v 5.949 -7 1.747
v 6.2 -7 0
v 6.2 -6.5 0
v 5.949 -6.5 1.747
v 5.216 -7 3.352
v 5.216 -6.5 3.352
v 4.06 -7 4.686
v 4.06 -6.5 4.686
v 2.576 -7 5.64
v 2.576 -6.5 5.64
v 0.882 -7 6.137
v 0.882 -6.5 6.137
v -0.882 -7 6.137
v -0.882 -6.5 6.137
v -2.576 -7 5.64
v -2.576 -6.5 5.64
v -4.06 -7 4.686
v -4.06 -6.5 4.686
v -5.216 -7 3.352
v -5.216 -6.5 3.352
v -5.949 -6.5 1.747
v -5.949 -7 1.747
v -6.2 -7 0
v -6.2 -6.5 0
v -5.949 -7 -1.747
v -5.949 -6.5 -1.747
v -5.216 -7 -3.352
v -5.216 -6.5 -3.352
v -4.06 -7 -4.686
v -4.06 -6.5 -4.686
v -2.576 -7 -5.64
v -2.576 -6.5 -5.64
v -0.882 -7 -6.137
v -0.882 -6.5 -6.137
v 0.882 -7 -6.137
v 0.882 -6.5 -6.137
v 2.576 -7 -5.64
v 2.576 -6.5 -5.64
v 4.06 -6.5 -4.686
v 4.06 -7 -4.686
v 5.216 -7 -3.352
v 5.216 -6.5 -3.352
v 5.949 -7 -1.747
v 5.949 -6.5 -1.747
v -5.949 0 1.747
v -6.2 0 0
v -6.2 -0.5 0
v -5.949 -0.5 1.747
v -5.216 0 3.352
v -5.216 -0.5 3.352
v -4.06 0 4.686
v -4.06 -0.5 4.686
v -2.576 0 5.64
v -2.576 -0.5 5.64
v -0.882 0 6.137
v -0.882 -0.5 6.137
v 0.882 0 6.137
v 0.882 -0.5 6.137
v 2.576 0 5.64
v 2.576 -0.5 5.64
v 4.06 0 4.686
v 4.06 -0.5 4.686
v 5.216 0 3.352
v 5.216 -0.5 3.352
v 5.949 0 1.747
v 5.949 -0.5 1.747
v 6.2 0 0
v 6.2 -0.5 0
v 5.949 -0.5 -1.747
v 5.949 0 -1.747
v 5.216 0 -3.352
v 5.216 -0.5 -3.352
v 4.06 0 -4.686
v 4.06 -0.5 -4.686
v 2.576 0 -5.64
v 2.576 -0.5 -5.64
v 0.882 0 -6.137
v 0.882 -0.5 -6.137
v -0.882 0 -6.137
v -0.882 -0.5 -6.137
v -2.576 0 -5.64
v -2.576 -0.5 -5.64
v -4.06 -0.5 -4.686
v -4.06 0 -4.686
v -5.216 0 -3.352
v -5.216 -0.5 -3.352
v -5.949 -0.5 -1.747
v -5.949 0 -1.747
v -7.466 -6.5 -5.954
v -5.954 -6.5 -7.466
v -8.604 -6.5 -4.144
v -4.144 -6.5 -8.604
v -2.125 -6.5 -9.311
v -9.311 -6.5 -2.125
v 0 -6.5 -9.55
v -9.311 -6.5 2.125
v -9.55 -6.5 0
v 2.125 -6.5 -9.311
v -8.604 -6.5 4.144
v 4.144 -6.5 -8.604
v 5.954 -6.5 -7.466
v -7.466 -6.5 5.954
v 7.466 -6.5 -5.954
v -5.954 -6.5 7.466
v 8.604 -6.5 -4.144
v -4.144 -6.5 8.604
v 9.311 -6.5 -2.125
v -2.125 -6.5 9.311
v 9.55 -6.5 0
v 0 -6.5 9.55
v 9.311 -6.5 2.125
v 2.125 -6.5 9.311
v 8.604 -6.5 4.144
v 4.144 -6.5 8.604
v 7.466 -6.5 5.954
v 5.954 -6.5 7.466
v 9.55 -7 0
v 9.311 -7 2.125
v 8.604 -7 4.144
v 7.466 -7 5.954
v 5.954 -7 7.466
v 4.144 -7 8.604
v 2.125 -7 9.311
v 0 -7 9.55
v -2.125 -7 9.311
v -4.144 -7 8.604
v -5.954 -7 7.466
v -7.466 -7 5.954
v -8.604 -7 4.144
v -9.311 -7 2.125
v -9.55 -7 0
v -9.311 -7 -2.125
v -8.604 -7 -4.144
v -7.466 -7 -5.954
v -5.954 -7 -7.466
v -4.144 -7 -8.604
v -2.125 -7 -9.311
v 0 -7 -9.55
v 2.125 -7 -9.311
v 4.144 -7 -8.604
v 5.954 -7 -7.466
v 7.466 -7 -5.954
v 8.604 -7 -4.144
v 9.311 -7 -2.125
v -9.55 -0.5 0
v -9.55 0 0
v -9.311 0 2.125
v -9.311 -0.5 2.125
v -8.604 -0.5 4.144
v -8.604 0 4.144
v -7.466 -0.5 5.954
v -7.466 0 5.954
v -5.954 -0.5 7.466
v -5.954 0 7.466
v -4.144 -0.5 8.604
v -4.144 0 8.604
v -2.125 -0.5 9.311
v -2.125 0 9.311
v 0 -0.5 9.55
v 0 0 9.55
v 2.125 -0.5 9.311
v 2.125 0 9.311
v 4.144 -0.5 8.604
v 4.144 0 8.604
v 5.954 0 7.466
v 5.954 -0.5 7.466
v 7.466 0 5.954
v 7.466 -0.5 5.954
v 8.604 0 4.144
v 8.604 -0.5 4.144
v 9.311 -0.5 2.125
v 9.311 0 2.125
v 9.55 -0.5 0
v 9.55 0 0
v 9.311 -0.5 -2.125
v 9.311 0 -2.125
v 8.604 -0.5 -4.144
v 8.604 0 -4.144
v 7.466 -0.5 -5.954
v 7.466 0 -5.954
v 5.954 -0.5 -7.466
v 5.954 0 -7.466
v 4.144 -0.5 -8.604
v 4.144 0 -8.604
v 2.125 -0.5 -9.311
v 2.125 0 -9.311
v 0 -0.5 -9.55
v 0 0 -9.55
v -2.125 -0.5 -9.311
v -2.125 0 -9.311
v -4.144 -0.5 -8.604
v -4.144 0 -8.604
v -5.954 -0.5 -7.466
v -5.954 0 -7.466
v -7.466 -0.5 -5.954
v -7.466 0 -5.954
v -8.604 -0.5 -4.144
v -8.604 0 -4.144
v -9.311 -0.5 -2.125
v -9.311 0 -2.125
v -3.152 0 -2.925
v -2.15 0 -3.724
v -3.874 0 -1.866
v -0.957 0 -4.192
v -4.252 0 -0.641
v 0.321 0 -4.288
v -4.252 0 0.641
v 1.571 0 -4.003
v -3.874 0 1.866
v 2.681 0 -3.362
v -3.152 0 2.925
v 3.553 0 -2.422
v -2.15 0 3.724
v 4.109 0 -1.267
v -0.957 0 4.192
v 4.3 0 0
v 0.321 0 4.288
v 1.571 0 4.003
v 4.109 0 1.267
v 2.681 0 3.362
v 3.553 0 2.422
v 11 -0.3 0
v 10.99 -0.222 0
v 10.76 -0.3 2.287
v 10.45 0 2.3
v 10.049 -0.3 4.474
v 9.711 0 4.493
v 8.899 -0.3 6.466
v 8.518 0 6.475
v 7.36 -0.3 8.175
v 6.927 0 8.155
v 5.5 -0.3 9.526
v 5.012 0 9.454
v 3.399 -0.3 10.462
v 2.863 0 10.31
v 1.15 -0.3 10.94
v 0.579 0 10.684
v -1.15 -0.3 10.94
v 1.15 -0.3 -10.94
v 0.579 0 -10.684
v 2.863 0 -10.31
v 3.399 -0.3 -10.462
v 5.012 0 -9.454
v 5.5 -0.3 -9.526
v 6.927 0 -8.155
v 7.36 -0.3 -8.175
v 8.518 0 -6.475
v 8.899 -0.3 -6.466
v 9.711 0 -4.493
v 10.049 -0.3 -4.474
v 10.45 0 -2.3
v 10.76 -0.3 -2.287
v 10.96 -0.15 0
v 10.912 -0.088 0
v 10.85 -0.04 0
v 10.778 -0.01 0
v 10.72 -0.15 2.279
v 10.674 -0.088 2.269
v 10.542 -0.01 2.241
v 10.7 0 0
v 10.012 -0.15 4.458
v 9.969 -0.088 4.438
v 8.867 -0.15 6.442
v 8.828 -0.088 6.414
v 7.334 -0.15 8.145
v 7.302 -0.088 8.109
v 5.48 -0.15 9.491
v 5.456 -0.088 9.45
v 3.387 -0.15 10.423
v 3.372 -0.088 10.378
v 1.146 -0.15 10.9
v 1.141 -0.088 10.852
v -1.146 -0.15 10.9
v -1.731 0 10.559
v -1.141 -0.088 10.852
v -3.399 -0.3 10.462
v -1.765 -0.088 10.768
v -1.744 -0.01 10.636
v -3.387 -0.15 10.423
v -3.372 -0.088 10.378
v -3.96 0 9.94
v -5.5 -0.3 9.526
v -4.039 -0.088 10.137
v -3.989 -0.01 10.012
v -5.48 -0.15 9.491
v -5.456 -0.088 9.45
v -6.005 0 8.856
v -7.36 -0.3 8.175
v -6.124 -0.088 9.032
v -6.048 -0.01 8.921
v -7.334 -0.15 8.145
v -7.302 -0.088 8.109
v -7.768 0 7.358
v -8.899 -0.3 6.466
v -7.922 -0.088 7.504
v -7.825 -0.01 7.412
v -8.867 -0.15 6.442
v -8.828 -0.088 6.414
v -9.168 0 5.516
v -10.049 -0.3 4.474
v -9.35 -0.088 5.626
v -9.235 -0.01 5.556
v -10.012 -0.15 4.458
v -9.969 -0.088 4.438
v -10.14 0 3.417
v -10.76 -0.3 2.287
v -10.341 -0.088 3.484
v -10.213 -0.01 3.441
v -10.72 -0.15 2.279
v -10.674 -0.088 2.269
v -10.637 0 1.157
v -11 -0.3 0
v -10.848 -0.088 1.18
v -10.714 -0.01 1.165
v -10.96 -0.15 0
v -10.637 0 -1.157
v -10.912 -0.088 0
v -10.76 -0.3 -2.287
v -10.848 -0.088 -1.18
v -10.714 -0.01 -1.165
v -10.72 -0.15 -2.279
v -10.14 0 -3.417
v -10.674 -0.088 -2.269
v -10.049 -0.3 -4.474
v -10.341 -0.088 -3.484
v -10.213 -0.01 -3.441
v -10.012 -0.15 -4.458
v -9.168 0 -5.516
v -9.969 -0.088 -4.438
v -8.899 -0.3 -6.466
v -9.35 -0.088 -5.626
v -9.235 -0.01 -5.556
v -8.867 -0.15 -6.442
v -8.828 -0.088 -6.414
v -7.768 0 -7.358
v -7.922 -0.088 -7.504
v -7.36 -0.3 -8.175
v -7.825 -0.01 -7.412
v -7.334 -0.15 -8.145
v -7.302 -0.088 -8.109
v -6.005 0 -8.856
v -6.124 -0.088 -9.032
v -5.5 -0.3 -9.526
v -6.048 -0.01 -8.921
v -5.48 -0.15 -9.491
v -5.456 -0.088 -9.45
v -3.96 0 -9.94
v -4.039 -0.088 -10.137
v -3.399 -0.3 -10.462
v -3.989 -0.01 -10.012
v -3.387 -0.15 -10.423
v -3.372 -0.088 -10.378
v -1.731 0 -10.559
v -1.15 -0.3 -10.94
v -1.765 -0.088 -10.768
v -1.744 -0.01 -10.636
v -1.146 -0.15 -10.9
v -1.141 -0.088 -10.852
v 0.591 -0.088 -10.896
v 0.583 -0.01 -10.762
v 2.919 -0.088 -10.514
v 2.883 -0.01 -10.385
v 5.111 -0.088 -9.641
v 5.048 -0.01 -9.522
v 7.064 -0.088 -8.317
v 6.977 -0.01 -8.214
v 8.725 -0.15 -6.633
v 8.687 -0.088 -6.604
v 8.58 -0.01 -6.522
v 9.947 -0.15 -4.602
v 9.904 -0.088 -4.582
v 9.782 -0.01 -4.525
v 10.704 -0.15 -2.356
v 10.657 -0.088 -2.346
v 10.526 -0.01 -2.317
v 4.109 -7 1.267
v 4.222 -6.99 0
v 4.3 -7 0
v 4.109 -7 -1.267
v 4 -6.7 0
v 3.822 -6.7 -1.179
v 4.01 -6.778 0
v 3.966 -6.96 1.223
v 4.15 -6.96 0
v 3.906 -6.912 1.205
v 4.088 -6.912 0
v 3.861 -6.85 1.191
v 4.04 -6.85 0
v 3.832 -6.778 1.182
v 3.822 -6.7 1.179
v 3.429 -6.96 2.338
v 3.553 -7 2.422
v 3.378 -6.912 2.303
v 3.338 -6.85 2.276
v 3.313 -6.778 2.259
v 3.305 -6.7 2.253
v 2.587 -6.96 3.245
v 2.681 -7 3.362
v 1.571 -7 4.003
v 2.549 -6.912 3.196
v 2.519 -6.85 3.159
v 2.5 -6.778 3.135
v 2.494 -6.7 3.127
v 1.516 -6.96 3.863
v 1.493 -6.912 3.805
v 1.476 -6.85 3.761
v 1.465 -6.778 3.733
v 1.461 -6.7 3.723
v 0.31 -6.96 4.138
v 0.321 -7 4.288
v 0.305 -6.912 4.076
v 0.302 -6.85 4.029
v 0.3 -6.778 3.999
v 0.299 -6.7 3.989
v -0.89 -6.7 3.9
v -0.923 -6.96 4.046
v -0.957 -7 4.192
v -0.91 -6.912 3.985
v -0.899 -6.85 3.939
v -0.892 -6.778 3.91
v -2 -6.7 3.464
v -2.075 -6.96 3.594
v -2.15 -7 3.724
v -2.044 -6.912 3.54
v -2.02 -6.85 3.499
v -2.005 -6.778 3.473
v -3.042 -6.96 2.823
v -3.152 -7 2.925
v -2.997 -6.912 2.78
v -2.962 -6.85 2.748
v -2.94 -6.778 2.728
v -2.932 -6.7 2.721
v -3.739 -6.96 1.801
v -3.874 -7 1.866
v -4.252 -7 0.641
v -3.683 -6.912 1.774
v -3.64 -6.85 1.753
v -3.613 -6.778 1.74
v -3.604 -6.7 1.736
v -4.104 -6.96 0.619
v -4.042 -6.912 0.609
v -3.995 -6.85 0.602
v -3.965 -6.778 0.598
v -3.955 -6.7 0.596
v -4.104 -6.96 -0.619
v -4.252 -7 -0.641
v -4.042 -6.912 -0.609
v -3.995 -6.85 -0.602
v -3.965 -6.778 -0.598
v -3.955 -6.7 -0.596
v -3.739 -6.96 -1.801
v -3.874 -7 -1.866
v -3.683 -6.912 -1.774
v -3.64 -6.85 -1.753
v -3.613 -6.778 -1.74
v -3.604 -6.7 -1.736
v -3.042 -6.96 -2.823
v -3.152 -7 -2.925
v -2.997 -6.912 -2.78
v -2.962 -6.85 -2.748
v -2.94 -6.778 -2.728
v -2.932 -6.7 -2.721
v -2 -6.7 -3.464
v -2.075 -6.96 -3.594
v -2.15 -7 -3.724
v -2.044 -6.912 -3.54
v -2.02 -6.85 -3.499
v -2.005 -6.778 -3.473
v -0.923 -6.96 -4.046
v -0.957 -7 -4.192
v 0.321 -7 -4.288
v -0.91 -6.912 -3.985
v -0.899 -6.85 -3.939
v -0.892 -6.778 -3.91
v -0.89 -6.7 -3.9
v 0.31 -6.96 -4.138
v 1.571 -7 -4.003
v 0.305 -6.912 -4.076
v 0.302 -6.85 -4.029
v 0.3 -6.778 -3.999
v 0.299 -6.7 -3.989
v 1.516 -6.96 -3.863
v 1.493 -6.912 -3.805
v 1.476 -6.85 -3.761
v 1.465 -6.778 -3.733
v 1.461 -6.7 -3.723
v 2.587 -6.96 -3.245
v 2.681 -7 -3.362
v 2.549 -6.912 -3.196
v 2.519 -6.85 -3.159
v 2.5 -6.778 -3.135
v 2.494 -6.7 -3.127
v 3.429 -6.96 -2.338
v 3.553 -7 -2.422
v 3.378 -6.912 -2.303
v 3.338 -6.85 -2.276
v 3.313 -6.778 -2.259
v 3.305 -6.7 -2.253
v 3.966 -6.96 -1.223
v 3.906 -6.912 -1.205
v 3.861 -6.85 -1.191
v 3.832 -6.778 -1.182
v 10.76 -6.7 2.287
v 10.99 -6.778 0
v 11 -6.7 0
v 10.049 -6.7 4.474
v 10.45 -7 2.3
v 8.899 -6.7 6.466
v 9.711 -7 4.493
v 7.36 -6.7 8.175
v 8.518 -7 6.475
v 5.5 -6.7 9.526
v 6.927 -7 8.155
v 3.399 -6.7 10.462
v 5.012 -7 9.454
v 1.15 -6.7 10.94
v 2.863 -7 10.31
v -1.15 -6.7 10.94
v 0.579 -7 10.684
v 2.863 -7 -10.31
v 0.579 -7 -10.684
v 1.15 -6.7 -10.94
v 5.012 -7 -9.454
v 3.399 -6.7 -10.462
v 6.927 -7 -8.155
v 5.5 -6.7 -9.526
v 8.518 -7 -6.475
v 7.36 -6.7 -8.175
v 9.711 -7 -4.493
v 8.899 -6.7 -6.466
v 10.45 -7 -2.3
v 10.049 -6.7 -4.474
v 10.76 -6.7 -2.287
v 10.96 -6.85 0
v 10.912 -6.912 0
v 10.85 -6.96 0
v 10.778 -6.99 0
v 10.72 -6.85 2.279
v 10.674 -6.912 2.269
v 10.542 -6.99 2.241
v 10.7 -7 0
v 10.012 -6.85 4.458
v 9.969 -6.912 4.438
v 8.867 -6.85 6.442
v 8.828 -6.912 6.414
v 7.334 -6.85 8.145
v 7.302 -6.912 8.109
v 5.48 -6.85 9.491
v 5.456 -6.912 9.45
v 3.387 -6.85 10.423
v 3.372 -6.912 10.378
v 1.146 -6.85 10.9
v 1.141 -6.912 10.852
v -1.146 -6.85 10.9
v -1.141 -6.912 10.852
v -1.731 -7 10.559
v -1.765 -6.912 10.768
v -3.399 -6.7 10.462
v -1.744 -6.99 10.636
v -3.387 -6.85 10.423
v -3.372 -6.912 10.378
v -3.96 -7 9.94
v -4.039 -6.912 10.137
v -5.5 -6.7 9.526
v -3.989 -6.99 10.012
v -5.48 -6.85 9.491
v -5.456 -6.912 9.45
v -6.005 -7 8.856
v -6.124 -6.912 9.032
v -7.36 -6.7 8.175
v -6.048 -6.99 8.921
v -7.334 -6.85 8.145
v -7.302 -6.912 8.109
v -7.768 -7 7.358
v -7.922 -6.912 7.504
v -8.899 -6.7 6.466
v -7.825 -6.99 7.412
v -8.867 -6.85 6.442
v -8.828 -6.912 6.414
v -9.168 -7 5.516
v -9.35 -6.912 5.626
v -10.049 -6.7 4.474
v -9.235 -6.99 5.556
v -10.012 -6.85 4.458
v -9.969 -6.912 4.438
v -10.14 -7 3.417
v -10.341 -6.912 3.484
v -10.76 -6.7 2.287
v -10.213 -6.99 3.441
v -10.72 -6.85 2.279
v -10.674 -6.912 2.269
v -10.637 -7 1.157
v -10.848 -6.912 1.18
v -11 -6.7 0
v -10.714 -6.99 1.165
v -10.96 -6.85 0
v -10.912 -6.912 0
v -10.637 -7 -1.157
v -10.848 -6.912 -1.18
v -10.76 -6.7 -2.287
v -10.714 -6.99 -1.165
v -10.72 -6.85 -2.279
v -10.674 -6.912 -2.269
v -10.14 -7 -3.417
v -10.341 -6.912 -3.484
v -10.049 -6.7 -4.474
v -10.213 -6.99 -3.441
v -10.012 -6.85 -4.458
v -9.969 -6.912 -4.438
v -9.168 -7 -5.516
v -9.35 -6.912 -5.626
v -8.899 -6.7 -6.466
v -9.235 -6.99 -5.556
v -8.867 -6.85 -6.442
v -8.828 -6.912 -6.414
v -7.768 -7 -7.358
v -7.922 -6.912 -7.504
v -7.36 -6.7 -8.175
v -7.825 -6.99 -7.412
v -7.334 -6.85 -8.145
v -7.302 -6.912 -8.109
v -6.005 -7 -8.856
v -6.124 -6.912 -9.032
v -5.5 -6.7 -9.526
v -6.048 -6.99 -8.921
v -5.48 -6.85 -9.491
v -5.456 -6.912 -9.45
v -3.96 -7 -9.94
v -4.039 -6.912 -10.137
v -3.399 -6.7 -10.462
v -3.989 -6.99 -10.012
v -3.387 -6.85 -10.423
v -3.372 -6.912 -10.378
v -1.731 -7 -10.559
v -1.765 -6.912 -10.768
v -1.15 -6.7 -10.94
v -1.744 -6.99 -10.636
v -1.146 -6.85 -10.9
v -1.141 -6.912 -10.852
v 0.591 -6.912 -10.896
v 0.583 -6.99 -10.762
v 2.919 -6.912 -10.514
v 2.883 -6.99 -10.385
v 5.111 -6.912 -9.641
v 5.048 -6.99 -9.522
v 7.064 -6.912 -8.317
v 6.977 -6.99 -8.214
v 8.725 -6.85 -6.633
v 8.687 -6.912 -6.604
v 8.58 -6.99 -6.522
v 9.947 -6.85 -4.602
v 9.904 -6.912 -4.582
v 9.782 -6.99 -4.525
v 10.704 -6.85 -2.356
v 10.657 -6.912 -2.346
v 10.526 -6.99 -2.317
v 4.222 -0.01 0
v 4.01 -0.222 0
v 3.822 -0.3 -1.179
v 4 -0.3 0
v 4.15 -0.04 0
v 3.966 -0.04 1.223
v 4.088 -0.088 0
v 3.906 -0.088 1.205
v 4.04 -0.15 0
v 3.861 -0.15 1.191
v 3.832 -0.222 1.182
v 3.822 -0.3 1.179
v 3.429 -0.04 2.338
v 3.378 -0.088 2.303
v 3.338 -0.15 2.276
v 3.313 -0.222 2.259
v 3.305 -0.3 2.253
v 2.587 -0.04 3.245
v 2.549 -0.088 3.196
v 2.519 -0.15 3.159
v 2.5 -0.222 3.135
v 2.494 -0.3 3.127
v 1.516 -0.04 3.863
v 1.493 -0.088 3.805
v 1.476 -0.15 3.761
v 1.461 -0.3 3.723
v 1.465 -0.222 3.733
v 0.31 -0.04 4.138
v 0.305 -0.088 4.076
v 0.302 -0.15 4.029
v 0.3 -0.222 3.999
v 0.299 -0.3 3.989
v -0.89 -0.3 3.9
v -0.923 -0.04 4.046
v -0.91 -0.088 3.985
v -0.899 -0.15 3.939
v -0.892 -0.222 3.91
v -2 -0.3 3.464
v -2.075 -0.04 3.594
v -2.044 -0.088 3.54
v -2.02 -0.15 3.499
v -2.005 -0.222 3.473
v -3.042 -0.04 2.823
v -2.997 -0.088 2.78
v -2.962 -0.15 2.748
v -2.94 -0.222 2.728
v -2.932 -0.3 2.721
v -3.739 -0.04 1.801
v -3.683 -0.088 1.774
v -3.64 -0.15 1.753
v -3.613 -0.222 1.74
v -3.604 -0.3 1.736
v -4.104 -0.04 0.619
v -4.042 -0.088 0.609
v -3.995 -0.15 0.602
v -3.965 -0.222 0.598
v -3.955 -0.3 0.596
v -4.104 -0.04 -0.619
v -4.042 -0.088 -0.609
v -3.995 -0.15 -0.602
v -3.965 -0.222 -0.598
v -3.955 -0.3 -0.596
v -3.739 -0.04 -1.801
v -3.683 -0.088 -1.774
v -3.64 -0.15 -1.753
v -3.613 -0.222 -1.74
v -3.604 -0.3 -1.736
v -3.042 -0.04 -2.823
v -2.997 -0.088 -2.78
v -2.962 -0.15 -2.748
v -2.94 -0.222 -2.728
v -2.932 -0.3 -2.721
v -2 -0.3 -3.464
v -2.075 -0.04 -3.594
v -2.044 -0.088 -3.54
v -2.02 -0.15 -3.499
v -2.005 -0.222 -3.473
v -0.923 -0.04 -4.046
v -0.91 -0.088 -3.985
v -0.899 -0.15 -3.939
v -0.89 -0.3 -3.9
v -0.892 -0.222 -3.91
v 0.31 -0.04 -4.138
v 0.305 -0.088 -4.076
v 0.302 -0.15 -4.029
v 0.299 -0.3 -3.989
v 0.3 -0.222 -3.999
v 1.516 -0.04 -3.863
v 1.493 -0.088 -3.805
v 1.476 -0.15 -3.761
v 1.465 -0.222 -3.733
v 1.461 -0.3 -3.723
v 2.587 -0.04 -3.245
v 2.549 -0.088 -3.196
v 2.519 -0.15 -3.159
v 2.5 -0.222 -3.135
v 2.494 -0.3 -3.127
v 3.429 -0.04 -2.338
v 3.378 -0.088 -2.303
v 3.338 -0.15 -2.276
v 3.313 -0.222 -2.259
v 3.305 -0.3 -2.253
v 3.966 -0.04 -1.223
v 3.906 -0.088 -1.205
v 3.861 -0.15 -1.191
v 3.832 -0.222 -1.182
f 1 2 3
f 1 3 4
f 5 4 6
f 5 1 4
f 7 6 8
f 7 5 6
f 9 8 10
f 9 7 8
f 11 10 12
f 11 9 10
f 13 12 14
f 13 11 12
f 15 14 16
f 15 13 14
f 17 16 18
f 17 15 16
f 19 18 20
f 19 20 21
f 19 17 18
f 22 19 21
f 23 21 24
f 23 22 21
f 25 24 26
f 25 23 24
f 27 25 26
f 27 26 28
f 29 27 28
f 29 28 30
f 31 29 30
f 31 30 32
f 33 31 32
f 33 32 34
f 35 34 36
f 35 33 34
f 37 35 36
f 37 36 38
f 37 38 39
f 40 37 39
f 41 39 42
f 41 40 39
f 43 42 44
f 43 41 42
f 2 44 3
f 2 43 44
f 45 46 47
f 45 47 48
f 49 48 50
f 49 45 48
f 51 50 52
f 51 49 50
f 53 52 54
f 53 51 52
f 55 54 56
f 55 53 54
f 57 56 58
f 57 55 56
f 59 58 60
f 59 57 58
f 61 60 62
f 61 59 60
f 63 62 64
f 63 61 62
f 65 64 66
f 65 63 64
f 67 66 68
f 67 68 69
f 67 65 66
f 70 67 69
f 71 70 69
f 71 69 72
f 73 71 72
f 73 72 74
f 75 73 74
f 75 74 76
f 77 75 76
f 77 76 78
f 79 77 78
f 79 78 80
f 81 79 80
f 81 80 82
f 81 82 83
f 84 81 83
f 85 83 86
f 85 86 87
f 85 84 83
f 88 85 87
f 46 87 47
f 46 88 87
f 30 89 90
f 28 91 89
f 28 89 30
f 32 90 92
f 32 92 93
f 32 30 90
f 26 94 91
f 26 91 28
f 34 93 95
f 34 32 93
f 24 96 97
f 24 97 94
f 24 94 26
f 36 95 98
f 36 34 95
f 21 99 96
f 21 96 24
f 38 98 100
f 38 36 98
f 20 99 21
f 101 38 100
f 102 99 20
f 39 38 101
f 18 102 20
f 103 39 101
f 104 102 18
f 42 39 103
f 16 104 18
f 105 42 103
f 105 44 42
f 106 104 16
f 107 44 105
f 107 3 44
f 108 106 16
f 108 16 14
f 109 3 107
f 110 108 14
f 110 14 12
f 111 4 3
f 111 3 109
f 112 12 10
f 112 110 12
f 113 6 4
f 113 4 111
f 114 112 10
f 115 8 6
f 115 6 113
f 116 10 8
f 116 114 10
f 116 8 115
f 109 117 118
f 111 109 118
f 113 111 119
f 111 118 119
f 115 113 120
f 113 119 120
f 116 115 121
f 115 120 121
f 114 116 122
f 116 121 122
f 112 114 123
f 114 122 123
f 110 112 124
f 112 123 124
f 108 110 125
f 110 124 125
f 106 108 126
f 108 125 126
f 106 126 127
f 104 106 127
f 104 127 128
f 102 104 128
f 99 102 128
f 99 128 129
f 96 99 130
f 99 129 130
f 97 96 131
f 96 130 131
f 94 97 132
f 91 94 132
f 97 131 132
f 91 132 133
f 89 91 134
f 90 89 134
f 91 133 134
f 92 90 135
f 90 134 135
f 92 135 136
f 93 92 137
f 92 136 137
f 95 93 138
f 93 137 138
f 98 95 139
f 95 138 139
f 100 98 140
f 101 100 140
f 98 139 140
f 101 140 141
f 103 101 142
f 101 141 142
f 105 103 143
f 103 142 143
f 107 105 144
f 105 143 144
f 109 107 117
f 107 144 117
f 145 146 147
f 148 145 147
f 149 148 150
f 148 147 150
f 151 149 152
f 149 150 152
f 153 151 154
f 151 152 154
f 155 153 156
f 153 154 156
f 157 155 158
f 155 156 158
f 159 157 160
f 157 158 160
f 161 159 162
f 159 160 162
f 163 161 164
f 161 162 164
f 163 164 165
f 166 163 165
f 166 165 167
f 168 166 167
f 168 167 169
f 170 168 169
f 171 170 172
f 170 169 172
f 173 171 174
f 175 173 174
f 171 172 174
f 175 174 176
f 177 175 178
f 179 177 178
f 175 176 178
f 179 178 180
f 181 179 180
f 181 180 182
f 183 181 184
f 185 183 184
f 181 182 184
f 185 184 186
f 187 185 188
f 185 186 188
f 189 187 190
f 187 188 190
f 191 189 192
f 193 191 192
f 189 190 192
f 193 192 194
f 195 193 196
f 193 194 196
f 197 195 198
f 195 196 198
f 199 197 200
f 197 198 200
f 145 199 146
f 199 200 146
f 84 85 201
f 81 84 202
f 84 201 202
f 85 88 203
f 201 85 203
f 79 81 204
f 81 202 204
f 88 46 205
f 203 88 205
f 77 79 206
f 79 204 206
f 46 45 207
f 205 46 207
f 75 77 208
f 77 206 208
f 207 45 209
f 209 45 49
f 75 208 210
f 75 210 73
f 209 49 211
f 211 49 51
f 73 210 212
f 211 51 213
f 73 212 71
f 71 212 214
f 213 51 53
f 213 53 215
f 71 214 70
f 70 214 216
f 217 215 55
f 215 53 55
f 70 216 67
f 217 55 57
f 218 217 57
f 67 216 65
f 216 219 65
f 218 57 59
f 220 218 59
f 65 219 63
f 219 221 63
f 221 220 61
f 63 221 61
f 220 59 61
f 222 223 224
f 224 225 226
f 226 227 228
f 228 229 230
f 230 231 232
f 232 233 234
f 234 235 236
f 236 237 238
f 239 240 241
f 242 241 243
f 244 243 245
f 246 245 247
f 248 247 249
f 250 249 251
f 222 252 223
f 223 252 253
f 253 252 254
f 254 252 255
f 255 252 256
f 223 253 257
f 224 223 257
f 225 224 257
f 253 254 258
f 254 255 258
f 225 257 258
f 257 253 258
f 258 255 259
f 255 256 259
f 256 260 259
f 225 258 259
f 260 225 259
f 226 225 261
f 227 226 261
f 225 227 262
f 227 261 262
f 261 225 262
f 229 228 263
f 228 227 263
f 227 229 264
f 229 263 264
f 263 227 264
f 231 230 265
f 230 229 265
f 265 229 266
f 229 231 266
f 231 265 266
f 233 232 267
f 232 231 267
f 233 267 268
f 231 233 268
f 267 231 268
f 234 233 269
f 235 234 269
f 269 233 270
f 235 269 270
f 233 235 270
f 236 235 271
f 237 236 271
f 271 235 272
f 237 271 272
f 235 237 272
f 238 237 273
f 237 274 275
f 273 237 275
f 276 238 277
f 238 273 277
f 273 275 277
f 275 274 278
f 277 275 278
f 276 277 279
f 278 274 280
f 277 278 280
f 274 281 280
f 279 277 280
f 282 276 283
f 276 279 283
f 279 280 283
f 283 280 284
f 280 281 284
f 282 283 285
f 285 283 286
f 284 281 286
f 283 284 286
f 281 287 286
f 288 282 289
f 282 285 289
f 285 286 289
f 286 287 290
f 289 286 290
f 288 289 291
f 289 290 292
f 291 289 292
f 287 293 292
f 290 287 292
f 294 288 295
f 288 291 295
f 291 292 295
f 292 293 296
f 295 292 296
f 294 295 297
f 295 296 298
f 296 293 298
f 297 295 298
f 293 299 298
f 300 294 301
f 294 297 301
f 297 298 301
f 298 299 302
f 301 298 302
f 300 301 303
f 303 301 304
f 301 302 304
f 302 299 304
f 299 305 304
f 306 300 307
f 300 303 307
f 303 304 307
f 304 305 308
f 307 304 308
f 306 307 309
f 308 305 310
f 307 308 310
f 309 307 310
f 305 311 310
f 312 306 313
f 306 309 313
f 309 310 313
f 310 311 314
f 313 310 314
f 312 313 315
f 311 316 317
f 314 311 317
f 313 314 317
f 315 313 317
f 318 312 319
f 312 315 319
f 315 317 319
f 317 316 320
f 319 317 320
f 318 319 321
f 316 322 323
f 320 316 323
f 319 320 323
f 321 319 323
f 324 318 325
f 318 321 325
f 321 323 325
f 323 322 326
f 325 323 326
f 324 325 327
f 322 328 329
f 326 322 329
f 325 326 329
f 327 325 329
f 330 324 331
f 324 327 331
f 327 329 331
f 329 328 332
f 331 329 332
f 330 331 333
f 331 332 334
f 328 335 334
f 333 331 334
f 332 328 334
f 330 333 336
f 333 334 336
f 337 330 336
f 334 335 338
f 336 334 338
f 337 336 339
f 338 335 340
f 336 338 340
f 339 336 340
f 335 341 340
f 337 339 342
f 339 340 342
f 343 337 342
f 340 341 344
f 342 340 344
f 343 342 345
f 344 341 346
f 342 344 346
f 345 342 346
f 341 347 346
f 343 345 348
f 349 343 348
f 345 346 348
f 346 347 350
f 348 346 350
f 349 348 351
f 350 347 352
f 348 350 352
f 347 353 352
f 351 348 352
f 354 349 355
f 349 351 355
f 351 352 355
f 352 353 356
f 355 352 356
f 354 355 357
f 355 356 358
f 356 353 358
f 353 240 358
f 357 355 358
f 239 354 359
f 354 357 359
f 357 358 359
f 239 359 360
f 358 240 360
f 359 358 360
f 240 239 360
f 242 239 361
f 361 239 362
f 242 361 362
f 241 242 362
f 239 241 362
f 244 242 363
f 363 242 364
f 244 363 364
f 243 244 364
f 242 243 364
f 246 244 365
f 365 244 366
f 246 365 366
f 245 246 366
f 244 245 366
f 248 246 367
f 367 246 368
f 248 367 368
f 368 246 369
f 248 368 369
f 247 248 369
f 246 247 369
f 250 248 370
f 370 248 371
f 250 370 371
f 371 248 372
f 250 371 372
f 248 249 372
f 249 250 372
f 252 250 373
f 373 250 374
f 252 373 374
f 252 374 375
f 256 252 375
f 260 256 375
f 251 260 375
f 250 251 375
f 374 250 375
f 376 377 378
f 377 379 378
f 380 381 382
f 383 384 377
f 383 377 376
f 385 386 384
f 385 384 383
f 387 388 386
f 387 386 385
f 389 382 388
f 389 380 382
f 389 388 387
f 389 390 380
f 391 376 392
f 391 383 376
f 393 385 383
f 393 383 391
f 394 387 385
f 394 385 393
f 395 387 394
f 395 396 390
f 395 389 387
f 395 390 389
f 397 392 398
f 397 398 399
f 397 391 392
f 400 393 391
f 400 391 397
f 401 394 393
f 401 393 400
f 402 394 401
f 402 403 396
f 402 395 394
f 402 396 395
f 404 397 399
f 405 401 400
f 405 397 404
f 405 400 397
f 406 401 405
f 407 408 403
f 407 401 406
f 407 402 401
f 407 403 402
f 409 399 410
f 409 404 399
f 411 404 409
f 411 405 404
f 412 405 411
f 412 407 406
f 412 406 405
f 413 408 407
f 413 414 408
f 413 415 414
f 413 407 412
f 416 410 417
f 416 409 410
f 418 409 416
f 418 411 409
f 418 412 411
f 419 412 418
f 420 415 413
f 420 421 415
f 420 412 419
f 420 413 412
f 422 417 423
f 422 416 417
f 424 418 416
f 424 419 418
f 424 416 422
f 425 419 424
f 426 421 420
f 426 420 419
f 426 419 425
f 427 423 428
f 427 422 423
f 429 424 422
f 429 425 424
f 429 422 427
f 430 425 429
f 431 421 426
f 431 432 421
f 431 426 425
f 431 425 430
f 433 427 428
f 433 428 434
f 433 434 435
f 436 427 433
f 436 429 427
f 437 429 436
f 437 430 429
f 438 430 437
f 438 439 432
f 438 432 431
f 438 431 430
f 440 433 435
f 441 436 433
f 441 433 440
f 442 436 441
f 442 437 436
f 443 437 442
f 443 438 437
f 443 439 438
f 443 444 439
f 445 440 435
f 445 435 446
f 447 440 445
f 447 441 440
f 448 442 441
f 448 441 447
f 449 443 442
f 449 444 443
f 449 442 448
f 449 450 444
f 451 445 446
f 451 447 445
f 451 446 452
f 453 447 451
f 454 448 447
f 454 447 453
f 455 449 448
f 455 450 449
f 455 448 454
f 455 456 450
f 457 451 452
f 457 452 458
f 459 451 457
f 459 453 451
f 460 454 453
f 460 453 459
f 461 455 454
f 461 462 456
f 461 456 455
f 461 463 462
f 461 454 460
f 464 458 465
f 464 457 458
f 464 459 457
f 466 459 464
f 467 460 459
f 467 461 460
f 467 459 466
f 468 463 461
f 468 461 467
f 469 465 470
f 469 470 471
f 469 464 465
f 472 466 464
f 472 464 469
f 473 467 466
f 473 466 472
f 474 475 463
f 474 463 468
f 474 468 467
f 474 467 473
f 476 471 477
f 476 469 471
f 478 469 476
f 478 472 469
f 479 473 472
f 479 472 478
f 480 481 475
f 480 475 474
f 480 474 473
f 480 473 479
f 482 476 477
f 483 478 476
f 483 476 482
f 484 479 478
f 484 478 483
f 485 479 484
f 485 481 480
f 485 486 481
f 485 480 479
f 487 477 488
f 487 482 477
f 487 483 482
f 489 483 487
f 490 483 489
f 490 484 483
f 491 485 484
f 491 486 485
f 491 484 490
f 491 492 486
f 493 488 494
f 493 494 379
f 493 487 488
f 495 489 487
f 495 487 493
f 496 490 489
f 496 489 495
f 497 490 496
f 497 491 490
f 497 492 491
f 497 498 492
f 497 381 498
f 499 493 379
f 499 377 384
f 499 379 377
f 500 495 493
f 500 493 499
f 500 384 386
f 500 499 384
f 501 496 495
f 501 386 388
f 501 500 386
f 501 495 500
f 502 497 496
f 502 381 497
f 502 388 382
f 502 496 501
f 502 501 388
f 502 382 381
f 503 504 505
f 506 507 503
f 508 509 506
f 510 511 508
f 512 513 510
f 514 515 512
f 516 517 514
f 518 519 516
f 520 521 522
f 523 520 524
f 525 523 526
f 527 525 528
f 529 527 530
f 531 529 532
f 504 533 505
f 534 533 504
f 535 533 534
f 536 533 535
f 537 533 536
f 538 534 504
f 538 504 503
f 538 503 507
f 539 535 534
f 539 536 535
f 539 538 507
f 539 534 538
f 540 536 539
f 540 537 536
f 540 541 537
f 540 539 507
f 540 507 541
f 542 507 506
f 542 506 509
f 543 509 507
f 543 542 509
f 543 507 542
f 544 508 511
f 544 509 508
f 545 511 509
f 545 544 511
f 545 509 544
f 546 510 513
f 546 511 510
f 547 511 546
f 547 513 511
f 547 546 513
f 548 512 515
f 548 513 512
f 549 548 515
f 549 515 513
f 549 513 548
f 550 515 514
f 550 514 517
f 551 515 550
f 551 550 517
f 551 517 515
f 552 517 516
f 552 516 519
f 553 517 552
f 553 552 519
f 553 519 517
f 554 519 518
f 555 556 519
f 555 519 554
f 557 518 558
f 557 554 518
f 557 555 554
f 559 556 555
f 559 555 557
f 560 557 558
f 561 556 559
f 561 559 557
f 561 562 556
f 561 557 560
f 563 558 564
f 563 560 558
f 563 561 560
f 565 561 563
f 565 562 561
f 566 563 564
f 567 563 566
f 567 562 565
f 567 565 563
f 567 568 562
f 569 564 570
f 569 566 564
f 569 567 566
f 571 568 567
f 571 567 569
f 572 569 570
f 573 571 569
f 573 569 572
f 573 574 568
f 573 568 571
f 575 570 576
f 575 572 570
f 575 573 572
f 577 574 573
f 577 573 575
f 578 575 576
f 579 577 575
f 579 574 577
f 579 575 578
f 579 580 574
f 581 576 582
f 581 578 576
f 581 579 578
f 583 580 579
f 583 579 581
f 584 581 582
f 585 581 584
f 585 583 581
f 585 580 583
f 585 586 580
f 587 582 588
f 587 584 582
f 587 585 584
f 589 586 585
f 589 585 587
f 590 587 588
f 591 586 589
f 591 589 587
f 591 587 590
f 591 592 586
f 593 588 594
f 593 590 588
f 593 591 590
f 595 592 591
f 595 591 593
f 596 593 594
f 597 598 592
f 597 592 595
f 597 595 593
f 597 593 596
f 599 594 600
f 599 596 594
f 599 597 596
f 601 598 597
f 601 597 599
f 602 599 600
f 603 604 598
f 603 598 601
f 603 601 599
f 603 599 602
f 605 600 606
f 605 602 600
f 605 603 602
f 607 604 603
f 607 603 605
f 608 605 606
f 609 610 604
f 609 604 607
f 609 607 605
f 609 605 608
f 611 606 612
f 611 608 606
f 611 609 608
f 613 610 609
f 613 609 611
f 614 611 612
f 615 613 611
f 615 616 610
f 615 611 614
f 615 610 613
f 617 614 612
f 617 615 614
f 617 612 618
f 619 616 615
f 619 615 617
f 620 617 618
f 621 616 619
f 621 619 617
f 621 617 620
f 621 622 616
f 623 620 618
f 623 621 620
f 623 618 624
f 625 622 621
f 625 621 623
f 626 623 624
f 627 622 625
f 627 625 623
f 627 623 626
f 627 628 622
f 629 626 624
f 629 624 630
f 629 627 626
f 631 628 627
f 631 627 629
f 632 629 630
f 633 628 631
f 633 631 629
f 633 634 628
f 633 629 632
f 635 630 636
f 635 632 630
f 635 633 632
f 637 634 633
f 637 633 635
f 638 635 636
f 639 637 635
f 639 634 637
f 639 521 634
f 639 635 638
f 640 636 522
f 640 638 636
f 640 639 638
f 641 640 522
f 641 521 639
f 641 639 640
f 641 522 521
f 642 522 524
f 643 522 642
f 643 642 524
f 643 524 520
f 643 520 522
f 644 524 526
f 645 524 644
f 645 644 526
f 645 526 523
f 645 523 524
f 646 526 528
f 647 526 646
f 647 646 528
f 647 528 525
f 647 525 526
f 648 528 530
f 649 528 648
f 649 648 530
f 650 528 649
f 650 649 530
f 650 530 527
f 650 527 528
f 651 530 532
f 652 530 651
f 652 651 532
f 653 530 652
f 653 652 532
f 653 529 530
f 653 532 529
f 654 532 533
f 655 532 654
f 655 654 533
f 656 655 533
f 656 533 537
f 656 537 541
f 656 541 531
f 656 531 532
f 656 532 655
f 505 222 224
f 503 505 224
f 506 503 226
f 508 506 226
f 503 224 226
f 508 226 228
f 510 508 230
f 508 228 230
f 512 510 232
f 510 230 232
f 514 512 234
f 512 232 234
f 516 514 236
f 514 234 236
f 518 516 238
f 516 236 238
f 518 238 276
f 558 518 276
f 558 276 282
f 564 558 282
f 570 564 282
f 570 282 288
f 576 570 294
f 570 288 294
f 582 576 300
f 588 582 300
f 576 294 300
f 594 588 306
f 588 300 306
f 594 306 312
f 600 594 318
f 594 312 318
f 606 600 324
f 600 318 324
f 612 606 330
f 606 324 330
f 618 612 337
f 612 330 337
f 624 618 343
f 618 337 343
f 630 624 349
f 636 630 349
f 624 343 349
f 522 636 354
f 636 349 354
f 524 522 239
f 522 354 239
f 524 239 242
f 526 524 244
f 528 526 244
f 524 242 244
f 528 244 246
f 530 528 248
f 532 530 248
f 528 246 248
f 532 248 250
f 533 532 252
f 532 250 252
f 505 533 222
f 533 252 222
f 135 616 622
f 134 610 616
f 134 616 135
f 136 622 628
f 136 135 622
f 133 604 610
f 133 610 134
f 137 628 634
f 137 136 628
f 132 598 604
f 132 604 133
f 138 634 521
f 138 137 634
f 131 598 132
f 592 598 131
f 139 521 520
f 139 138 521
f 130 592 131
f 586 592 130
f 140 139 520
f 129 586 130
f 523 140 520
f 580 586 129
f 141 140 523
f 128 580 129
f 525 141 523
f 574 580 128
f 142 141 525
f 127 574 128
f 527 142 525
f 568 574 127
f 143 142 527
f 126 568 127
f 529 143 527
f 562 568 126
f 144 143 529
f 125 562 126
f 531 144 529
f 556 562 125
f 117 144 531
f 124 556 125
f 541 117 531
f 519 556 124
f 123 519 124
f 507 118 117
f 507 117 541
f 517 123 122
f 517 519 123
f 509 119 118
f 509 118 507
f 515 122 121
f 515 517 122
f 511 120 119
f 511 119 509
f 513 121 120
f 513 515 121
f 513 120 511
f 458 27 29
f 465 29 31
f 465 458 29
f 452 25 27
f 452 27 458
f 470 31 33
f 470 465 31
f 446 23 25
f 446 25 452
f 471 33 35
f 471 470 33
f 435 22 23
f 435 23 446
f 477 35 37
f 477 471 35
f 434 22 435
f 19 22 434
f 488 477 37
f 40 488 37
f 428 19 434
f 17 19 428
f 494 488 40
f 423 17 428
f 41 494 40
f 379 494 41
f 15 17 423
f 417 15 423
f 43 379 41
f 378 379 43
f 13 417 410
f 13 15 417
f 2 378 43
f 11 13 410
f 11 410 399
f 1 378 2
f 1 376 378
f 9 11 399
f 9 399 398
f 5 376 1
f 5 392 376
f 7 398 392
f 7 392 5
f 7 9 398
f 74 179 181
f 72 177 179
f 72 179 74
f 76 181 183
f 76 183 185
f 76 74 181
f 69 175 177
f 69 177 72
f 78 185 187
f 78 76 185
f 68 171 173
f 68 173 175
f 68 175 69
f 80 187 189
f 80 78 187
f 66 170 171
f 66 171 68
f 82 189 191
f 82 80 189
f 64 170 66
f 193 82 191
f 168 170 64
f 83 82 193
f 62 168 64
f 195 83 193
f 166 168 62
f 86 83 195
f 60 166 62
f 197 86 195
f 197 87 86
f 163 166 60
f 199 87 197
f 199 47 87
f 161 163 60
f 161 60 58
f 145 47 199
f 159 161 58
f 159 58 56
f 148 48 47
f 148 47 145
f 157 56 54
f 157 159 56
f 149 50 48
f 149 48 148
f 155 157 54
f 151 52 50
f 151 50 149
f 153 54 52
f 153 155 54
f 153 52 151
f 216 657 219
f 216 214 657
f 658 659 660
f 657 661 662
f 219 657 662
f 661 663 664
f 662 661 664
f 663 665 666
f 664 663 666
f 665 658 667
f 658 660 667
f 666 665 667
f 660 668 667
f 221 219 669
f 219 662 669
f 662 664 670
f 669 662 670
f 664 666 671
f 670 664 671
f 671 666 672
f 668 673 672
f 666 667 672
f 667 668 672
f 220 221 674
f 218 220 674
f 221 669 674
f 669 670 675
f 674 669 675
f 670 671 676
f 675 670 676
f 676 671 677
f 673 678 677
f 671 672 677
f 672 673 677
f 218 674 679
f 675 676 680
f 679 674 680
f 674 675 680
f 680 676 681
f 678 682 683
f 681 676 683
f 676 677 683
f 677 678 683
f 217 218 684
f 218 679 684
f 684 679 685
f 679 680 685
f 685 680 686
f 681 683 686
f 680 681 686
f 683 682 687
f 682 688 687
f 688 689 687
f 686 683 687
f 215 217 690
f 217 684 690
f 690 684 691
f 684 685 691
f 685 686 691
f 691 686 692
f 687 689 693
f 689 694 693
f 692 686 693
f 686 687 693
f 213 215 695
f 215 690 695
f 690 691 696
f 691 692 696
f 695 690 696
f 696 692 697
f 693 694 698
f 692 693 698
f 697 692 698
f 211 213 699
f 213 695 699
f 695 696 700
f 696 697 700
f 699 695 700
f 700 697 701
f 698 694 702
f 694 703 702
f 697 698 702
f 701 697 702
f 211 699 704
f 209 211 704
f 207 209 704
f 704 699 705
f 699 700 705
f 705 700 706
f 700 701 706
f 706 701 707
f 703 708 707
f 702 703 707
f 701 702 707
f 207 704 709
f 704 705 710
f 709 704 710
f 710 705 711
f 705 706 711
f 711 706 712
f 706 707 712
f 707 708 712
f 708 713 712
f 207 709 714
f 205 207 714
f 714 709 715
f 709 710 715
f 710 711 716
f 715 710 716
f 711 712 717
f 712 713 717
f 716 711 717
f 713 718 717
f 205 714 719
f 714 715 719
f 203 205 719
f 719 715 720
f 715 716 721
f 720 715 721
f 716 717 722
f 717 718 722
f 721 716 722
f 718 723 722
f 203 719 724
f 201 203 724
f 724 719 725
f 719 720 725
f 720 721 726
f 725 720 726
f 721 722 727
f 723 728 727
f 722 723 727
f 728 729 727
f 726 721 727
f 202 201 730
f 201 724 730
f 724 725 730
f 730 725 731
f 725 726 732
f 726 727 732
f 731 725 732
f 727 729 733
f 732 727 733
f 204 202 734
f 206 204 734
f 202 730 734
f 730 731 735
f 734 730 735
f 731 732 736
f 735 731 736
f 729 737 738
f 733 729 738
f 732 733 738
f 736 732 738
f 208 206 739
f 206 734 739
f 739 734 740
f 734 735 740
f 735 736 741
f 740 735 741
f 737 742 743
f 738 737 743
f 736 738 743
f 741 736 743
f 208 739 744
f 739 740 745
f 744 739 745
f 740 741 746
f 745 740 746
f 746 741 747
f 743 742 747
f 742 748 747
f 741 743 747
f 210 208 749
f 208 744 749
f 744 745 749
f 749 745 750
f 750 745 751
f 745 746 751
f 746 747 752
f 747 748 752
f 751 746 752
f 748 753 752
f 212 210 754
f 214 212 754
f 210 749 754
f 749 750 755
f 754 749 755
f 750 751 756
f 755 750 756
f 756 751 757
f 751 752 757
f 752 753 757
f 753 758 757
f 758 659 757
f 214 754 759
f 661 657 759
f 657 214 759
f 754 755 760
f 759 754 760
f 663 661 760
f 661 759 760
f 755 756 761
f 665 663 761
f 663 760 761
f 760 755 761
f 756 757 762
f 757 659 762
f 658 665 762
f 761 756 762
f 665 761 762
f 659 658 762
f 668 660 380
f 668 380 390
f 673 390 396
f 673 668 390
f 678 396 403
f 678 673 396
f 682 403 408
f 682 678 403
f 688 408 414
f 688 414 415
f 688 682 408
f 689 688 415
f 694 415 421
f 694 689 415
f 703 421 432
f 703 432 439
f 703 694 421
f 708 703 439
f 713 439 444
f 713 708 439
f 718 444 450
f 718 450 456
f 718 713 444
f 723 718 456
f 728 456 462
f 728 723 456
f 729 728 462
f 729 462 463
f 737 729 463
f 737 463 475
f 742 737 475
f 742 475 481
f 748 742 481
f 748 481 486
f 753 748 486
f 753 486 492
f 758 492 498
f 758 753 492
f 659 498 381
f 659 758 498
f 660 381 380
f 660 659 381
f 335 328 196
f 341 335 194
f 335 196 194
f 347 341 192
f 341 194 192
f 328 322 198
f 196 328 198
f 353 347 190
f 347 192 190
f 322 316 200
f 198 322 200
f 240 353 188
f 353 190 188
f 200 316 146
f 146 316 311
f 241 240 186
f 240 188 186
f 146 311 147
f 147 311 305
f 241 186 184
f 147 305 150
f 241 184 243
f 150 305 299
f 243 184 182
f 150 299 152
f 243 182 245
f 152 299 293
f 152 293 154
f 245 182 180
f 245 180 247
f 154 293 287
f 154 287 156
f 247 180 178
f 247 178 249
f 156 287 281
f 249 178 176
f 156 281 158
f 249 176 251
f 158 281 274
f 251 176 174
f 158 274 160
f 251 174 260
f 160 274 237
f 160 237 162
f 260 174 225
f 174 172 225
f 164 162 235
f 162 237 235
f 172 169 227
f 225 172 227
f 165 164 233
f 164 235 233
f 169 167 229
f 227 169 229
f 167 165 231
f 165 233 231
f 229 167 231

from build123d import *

# Parameters (mm, degrees)
F0_R     = 11
F0_R_2   = 4
F1_DEPTH = 7
F2_R     = 9.55
F2_R_2   = 6.2
F3_DEPTH = 0.5
F4_R     = 9.55
F4_R_2   = 6.2
F5_DEPTH = 0.5
F6_R     = 0.3
F7_R     = 0.3
F8_R     = 0.3


with BuildPart() as f1:
    # F0 (on Front) → F1 (new body)
    with BuildSketch(Plane.XZ):
        Circle(F0_R)
        Circle(F0_R_2, mode=Mode.SUBTRACT)
    extrude(amount=F1_DEPTH)

    # F2 (on face) → F3 (cut)
    with BuildSketch(Plane(origin=(0, 0, 0), x_dir=(-1, 0, 0), z_dir=(0, 1, 0))):
        Circle(F2_R)
        Circle(F2_R_2, mode=Mode.SUBTRACT)
    extrude(amount=-F3_DEPTH, mode=Mode.SUBTRACT)

    # F4 (on face) → F5 (cut)
    with BuildSketch(Plane.XZ.offset(7)):
        Circle(F4_R)
        Circle(F4_R_2, mode=Mode.SUBTRACT)
    extrude(amount=-F5_DEPTH, mode=Mode.SUBTRACT)

    # F6
    f6_edges = [f1.edges().sort_by_distance(p)[0] for p in [
        (-11, 0, 0),
    ]]
    fillet(f6_edges, radius=F6_R)

    # F7
    f7_edges = [f1.edges().sort_by_distance(p)[0] for p in [
        (-11, -7, 0),
        (-4, -7, 0),
    ]]
    fillet(f7_edges, radius=F7_R)

    # F8
    f8_edges = [f1.edges().sort_by_distance(p)[0] for p in [
        (-4, 0, 0),
    ]]
    fillet(f8_edges, radius=F8_R)


solid = f1.part
